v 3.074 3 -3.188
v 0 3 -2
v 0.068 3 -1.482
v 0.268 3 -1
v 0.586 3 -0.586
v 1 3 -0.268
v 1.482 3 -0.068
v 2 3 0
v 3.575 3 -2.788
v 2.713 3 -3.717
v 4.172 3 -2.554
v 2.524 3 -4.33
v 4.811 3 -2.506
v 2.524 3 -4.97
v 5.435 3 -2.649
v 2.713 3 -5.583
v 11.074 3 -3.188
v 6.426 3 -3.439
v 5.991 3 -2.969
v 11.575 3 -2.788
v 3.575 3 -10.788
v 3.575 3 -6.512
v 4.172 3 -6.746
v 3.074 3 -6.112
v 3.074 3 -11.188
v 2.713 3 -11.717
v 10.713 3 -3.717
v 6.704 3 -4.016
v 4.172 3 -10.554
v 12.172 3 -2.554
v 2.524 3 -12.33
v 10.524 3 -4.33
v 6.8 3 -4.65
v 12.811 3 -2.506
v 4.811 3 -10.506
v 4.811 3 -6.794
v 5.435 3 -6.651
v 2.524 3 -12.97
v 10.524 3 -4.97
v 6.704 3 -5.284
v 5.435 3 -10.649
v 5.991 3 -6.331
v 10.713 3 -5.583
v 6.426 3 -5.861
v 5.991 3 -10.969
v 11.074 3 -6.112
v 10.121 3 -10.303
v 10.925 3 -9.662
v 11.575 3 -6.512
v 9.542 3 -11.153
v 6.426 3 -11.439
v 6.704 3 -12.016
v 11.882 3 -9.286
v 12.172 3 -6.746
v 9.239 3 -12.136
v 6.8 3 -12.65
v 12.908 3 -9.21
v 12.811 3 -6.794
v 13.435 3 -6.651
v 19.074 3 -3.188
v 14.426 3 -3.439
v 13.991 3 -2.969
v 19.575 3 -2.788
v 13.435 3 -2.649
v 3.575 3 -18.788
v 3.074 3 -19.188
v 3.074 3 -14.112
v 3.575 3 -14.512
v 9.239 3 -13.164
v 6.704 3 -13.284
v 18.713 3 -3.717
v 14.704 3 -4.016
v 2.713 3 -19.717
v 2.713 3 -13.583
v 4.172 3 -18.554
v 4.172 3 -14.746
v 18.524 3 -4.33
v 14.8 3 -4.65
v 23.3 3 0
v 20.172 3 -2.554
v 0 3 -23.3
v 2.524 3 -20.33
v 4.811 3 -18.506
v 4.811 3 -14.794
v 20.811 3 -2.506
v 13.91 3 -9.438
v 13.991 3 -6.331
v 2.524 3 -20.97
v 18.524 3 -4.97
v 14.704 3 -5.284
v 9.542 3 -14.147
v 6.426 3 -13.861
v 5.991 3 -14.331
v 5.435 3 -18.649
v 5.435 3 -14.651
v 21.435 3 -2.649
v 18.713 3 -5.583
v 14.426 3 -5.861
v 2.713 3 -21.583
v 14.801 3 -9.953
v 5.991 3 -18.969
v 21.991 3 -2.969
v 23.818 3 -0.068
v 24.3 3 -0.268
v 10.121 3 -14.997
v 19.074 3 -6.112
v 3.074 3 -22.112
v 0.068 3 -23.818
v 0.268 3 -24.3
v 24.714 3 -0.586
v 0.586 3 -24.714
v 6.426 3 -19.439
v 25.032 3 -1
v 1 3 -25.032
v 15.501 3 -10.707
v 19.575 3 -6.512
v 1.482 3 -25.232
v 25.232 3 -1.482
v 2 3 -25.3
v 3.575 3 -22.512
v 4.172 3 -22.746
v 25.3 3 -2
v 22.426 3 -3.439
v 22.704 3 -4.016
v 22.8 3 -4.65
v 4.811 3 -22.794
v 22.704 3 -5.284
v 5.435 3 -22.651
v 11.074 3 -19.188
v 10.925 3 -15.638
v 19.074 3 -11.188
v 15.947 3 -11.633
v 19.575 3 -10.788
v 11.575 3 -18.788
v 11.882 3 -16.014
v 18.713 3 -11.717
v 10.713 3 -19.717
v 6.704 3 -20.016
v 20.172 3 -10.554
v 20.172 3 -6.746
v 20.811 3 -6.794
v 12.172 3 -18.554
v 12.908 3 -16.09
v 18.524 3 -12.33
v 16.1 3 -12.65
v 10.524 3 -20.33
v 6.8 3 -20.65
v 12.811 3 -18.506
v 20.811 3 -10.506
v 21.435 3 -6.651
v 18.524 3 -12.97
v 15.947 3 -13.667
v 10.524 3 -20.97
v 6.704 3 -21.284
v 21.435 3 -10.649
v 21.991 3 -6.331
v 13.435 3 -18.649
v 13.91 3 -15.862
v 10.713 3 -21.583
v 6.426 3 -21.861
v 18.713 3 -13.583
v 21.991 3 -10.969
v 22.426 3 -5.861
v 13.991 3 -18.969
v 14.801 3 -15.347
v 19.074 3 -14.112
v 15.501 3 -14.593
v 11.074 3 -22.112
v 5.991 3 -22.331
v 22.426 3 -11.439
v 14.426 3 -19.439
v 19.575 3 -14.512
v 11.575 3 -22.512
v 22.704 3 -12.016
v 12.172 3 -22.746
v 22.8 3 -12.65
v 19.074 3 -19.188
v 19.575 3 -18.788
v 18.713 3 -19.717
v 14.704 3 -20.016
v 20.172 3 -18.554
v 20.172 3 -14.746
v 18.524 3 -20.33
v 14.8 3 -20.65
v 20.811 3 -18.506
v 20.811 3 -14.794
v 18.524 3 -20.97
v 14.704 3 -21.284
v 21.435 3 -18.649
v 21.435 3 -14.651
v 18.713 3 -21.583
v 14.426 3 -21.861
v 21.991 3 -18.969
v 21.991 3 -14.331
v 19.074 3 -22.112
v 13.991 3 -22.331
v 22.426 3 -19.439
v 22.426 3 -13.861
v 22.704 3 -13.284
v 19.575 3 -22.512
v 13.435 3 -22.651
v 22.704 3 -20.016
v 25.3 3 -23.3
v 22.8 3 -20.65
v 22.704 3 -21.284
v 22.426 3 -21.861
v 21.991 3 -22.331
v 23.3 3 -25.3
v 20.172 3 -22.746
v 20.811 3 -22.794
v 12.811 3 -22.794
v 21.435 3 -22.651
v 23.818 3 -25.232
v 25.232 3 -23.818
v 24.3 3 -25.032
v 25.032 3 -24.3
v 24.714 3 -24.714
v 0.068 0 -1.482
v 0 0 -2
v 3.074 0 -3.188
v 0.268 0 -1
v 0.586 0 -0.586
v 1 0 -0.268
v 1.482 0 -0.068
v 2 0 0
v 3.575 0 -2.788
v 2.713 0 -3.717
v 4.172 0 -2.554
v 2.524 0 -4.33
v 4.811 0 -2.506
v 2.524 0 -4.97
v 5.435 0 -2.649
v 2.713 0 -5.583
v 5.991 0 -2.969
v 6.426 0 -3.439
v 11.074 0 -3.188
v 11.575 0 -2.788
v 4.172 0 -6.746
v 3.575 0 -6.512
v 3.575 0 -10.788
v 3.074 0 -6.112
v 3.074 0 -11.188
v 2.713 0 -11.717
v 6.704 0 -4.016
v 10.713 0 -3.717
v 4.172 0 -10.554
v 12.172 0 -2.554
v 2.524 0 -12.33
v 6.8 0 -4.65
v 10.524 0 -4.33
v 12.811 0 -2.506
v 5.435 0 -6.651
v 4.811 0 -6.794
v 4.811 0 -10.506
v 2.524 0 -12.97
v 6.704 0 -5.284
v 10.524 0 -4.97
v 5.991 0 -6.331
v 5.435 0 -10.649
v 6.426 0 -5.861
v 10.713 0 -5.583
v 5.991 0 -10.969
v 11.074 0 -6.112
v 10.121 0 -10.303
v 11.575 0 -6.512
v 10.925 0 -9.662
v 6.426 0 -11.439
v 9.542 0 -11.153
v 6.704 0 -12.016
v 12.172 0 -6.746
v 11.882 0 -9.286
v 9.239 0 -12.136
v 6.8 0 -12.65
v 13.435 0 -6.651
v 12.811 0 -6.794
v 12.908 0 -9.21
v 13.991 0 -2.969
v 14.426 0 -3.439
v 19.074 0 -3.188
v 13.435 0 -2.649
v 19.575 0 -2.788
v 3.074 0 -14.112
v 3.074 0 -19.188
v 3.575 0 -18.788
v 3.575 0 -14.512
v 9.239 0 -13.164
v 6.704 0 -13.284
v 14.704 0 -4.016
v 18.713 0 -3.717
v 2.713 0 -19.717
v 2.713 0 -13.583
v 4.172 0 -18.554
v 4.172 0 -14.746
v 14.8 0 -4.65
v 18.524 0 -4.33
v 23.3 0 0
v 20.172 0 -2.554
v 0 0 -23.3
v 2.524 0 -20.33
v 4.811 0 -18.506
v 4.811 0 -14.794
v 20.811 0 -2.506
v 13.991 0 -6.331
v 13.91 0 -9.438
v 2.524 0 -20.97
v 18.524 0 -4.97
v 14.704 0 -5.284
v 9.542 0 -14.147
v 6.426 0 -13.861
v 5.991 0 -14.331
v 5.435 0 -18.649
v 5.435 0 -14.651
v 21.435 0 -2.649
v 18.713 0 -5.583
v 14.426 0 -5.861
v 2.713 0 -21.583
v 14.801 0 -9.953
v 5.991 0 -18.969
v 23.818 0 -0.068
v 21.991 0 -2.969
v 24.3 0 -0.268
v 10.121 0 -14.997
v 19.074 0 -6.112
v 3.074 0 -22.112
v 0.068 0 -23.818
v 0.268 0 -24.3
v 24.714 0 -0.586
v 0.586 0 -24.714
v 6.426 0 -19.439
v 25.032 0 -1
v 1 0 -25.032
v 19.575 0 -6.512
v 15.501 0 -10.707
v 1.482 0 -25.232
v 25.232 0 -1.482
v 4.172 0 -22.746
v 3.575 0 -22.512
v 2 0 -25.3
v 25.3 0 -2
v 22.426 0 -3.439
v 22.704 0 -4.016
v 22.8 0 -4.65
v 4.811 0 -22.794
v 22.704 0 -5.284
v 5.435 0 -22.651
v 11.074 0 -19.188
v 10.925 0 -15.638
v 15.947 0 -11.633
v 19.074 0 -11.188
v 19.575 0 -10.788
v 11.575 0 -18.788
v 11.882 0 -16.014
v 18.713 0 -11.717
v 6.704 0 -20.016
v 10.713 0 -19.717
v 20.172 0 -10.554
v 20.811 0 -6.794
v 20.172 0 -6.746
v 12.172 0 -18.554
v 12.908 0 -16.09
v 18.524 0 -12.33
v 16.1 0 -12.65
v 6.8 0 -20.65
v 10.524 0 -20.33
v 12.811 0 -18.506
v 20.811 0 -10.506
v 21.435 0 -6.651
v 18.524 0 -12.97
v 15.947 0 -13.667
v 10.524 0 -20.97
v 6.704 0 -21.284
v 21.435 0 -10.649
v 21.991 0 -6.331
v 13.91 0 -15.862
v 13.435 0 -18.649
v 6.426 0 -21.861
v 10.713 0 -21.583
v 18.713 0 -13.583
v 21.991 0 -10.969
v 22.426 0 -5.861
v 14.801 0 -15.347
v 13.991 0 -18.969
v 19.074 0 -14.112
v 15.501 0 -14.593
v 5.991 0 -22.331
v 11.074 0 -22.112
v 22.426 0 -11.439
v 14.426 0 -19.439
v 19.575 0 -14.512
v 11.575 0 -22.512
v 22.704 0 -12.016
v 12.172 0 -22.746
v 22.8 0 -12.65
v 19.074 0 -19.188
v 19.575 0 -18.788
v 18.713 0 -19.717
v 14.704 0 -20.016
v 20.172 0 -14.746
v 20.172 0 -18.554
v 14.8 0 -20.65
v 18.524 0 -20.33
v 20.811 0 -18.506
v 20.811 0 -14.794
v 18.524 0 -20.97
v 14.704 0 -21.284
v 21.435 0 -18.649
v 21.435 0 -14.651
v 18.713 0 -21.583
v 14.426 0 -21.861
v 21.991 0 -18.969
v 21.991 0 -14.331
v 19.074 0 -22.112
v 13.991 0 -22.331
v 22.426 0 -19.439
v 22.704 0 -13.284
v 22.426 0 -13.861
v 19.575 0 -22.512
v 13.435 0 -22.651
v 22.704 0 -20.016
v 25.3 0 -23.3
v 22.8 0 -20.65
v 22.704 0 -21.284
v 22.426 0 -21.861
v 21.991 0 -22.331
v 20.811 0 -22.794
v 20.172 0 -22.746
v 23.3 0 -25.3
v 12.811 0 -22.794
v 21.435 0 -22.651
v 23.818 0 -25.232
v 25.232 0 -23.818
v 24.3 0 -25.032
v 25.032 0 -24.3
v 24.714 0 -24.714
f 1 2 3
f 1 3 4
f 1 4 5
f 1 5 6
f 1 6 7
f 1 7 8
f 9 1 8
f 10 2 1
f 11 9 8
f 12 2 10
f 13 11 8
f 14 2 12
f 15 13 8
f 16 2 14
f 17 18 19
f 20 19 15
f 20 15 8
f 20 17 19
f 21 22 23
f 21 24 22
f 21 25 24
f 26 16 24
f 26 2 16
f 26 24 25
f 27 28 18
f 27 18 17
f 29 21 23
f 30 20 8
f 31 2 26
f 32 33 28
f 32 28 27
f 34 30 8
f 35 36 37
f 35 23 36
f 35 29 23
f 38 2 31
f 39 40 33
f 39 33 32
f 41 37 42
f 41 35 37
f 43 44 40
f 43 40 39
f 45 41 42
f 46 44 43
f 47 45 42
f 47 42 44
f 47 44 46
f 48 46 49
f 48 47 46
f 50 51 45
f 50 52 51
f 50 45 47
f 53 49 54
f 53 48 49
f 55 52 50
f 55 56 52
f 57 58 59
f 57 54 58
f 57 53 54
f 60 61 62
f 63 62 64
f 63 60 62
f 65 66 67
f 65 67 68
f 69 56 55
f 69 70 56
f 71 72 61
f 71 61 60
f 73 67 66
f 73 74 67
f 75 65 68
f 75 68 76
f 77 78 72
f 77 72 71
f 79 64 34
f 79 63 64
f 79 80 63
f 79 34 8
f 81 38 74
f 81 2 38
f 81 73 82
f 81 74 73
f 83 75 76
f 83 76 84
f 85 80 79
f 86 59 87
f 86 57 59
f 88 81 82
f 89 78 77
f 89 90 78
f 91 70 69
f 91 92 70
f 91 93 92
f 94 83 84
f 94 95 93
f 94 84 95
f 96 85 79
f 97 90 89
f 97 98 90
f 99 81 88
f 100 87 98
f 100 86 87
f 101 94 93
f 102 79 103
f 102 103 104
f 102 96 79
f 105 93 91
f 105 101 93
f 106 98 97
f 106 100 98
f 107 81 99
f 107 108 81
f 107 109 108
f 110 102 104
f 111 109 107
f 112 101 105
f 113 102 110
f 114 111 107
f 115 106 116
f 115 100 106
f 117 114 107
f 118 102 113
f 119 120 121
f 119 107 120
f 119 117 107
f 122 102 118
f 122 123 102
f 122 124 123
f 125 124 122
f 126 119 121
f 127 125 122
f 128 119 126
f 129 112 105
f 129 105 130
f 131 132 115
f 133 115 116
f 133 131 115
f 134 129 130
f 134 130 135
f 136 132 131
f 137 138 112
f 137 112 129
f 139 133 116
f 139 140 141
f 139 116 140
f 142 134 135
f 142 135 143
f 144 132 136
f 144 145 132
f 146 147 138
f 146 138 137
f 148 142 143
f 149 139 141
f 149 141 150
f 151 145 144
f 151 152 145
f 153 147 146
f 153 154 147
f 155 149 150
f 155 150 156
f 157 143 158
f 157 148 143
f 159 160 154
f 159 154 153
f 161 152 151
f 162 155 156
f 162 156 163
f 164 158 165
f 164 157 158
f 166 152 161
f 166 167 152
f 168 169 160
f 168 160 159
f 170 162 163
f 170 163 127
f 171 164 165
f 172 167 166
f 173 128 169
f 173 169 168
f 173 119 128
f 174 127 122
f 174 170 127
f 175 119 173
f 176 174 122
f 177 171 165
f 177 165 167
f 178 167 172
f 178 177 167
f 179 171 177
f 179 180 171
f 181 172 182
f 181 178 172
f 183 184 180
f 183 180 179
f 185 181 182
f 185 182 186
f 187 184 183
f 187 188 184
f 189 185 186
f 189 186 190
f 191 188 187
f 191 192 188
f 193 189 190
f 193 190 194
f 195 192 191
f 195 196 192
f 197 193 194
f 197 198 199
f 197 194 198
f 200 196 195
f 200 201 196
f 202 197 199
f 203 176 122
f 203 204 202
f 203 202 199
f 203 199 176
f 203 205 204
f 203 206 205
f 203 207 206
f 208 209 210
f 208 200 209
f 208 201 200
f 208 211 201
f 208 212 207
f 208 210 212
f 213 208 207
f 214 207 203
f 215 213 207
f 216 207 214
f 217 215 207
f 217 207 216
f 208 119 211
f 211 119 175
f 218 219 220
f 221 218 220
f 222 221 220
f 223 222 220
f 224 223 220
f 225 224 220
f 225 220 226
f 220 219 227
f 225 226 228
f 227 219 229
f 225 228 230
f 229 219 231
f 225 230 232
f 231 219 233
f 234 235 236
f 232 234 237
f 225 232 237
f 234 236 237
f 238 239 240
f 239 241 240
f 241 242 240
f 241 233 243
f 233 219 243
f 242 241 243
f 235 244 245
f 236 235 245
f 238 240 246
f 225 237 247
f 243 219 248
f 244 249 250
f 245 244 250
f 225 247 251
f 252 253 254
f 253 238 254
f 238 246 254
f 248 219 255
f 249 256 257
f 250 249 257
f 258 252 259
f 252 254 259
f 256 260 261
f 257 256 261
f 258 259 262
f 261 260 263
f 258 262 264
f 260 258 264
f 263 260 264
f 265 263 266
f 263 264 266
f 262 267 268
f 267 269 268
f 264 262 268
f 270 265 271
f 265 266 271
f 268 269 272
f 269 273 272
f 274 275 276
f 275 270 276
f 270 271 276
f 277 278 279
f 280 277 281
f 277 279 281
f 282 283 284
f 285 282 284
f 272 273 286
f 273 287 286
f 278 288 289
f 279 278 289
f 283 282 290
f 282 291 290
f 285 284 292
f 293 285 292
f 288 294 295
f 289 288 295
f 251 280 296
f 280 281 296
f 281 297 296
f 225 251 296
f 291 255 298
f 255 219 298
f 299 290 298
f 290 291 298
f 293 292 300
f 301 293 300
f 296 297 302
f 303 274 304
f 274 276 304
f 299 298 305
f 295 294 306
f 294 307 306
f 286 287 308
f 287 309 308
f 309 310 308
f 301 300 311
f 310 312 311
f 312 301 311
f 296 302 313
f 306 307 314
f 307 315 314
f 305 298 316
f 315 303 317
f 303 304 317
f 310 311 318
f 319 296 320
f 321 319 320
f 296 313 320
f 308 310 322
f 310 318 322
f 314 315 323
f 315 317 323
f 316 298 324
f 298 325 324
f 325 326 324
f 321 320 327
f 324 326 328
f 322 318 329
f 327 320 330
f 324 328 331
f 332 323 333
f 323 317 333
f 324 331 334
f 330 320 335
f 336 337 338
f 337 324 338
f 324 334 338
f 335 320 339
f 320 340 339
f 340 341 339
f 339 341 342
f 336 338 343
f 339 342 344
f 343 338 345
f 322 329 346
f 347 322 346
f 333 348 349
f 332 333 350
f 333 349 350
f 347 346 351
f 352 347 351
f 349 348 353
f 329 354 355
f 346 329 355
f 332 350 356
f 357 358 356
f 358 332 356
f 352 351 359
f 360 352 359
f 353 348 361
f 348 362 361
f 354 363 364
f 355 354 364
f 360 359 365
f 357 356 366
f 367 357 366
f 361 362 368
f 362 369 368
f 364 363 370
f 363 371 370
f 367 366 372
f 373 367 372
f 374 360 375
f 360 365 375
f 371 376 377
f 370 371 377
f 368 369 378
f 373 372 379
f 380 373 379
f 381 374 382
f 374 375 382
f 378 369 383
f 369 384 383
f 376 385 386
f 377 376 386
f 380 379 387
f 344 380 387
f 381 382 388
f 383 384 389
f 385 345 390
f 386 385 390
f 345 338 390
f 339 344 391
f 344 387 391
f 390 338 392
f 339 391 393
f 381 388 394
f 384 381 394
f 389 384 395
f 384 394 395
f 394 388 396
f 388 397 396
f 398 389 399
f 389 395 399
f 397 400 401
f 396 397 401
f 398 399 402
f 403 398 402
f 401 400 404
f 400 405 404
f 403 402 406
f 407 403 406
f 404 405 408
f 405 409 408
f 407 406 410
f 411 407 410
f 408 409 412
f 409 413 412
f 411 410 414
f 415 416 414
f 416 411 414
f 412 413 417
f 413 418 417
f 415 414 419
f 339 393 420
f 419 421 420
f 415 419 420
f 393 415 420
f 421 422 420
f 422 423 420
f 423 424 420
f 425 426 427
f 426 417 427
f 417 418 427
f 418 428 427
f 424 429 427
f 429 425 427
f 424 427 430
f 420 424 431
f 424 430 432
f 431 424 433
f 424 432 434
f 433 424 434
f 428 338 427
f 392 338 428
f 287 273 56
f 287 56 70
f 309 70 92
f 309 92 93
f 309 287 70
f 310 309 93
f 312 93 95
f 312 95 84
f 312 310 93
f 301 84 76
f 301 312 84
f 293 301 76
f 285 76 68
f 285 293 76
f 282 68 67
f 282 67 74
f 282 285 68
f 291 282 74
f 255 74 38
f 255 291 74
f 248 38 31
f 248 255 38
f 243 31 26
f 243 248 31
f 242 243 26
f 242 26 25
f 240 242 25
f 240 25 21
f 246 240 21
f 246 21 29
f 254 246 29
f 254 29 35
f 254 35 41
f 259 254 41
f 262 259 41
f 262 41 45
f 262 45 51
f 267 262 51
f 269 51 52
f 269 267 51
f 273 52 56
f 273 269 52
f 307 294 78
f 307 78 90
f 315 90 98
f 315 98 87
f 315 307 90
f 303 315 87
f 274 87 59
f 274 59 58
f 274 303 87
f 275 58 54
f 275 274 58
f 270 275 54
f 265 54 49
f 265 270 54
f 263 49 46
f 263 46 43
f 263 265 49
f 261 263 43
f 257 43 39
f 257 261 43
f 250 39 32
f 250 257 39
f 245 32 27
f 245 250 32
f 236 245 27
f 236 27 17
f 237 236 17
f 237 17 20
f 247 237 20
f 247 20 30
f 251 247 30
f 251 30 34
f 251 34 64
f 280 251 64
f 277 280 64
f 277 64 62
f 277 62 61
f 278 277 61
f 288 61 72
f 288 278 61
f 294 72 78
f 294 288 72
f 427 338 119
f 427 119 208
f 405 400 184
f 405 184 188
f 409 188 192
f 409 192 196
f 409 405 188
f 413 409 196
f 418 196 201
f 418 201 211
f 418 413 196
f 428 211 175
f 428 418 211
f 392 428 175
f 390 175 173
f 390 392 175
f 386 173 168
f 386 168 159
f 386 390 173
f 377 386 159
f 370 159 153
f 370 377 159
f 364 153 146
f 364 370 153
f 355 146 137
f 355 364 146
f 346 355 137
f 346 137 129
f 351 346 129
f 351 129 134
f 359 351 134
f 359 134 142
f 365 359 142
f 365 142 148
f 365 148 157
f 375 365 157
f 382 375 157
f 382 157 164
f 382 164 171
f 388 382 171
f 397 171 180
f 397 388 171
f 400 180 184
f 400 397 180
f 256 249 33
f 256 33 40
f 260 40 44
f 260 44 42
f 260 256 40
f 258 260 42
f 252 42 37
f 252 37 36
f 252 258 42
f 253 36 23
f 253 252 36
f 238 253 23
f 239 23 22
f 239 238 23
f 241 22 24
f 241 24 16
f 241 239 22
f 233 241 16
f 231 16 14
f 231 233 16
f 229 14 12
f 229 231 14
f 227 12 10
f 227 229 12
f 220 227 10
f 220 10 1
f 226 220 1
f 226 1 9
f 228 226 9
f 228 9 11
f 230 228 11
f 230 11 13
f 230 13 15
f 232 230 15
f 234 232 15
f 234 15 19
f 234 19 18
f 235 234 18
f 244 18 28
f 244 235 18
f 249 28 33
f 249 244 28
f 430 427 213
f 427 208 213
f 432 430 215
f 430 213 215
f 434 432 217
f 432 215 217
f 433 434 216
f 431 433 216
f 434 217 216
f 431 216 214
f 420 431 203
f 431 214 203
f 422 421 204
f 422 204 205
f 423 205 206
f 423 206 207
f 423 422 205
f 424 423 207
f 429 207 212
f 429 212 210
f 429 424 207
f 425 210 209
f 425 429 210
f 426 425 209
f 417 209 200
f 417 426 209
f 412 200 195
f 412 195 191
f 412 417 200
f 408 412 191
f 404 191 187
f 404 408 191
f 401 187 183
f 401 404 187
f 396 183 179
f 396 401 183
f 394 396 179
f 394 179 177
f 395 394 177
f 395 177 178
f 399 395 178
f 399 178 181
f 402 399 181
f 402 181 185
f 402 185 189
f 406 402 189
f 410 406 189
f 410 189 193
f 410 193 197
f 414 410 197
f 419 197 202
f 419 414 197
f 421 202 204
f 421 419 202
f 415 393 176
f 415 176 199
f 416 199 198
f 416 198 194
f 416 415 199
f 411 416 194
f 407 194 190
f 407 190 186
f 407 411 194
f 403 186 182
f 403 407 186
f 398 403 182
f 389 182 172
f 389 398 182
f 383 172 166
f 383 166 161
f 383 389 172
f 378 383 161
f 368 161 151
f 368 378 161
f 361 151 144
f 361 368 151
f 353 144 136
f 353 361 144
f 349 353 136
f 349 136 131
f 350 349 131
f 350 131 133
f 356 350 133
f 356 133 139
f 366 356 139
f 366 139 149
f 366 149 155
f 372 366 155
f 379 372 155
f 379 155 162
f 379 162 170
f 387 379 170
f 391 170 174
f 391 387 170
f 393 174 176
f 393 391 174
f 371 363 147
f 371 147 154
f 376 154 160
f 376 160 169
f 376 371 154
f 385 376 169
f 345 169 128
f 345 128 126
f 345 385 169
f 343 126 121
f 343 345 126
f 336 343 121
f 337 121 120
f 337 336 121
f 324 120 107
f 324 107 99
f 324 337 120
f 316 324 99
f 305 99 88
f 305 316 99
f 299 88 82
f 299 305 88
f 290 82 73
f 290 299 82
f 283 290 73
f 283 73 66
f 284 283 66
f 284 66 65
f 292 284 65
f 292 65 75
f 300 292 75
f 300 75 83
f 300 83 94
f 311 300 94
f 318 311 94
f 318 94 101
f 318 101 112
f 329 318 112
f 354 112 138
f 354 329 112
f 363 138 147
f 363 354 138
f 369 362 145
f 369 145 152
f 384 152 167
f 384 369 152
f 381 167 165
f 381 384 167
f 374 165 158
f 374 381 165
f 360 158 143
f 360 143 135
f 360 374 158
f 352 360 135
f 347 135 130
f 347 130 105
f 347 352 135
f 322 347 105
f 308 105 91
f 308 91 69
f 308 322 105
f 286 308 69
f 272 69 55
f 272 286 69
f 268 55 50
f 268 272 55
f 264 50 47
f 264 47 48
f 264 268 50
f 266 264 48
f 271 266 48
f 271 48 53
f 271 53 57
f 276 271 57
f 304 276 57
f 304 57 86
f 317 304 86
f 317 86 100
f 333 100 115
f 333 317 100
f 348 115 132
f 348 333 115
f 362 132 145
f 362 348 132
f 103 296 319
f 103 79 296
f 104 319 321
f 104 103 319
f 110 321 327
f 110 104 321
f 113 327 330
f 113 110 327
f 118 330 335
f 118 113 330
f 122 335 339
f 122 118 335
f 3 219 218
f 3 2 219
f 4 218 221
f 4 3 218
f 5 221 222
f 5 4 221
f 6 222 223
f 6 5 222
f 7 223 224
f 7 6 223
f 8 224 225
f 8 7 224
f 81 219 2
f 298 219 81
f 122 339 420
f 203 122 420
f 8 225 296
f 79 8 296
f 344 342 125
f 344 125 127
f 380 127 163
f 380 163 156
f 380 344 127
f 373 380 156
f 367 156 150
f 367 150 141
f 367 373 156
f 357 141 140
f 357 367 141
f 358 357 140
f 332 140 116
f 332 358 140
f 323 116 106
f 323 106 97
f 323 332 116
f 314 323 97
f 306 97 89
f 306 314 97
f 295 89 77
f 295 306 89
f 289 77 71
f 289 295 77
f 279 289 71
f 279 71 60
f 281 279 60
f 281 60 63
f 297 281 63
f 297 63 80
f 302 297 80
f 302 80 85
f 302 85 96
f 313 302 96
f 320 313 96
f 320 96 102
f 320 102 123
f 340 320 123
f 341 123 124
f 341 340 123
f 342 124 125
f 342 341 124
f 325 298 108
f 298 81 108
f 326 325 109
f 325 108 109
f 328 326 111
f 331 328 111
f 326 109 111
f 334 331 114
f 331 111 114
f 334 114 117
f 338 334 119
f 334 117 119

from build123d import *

# Parameters (mm, degrees)
SKETCH1_W           = 25.3
SKETCH1_H           = 25.3
SKETCH1_R           = 2.15
SKETCH1_R_2         = 3.45
BOSS_EXTRUDE1_DEPTH = 3
FILLET1_R           = 2


with BuildPart() as part:
    # Sketch1 → Boss-Extrude1 (new body)
    with BuildSketch(Plane(origin=(0, 0, 0), x_dir=(1, 0, 0), z_dir=(0, 1, 0))):
        with Locations((12.65, 12.65)):
            Rectangle(SKETCH1_W, SKETCH1_H)
        with Locations((4.65, 4.65)):
            Circle(SKETCH1_R, mode=Mode.SUBTRACT)
        with Locations((12.65, 4.65)):
            Circle(SKETCH1_R, mode=Mode.SUBTRACT)
        with Locations((20.65, 4.65)):
            Circle(SKETCH1_R, mode=Mode.SUBTRACT)
        with Locations((4.65, 12.65)):
            Circle(SKETCH1_R, mode=Mode.SUBTRACT)
        with Locations((4.65, 20.65)):
            Circle(SKETCH1_R, mode=Mode.SUBTRACT)
        with Locations((20.65, 12.65)):
            Circle(SKETCH1_R, mode=Mode.SUBTRACT)
        with Locations((20.65, 20.65)):
            Circle(SKETCH1_R, mode=Mode.SUBTRACT)
        with Locations((12.65, 20.65)):
            Circle(SKETCH1_R, mode=Mode.SUBTRACT)
        with Locations((12.65, 12.65)):
            Circle(SKETCH1_R_2, mode=Mode.SUBTRACT)
    extrude(amount=BOSS_EXTRUDE1_DEPTH)

    # Fillet1
    fillet1_edges = [part.edges().sort_by_distance(p)[0] for p in [
        (0, 1.5, -25.3),
        (25.3, 1.5, -25.3),
        (25.3, 1.5, 0),
        (0, 1.5, 0),
    ]]
    fillet(fillet1_edges, radius=FILLET1_R)


solid = part.part
